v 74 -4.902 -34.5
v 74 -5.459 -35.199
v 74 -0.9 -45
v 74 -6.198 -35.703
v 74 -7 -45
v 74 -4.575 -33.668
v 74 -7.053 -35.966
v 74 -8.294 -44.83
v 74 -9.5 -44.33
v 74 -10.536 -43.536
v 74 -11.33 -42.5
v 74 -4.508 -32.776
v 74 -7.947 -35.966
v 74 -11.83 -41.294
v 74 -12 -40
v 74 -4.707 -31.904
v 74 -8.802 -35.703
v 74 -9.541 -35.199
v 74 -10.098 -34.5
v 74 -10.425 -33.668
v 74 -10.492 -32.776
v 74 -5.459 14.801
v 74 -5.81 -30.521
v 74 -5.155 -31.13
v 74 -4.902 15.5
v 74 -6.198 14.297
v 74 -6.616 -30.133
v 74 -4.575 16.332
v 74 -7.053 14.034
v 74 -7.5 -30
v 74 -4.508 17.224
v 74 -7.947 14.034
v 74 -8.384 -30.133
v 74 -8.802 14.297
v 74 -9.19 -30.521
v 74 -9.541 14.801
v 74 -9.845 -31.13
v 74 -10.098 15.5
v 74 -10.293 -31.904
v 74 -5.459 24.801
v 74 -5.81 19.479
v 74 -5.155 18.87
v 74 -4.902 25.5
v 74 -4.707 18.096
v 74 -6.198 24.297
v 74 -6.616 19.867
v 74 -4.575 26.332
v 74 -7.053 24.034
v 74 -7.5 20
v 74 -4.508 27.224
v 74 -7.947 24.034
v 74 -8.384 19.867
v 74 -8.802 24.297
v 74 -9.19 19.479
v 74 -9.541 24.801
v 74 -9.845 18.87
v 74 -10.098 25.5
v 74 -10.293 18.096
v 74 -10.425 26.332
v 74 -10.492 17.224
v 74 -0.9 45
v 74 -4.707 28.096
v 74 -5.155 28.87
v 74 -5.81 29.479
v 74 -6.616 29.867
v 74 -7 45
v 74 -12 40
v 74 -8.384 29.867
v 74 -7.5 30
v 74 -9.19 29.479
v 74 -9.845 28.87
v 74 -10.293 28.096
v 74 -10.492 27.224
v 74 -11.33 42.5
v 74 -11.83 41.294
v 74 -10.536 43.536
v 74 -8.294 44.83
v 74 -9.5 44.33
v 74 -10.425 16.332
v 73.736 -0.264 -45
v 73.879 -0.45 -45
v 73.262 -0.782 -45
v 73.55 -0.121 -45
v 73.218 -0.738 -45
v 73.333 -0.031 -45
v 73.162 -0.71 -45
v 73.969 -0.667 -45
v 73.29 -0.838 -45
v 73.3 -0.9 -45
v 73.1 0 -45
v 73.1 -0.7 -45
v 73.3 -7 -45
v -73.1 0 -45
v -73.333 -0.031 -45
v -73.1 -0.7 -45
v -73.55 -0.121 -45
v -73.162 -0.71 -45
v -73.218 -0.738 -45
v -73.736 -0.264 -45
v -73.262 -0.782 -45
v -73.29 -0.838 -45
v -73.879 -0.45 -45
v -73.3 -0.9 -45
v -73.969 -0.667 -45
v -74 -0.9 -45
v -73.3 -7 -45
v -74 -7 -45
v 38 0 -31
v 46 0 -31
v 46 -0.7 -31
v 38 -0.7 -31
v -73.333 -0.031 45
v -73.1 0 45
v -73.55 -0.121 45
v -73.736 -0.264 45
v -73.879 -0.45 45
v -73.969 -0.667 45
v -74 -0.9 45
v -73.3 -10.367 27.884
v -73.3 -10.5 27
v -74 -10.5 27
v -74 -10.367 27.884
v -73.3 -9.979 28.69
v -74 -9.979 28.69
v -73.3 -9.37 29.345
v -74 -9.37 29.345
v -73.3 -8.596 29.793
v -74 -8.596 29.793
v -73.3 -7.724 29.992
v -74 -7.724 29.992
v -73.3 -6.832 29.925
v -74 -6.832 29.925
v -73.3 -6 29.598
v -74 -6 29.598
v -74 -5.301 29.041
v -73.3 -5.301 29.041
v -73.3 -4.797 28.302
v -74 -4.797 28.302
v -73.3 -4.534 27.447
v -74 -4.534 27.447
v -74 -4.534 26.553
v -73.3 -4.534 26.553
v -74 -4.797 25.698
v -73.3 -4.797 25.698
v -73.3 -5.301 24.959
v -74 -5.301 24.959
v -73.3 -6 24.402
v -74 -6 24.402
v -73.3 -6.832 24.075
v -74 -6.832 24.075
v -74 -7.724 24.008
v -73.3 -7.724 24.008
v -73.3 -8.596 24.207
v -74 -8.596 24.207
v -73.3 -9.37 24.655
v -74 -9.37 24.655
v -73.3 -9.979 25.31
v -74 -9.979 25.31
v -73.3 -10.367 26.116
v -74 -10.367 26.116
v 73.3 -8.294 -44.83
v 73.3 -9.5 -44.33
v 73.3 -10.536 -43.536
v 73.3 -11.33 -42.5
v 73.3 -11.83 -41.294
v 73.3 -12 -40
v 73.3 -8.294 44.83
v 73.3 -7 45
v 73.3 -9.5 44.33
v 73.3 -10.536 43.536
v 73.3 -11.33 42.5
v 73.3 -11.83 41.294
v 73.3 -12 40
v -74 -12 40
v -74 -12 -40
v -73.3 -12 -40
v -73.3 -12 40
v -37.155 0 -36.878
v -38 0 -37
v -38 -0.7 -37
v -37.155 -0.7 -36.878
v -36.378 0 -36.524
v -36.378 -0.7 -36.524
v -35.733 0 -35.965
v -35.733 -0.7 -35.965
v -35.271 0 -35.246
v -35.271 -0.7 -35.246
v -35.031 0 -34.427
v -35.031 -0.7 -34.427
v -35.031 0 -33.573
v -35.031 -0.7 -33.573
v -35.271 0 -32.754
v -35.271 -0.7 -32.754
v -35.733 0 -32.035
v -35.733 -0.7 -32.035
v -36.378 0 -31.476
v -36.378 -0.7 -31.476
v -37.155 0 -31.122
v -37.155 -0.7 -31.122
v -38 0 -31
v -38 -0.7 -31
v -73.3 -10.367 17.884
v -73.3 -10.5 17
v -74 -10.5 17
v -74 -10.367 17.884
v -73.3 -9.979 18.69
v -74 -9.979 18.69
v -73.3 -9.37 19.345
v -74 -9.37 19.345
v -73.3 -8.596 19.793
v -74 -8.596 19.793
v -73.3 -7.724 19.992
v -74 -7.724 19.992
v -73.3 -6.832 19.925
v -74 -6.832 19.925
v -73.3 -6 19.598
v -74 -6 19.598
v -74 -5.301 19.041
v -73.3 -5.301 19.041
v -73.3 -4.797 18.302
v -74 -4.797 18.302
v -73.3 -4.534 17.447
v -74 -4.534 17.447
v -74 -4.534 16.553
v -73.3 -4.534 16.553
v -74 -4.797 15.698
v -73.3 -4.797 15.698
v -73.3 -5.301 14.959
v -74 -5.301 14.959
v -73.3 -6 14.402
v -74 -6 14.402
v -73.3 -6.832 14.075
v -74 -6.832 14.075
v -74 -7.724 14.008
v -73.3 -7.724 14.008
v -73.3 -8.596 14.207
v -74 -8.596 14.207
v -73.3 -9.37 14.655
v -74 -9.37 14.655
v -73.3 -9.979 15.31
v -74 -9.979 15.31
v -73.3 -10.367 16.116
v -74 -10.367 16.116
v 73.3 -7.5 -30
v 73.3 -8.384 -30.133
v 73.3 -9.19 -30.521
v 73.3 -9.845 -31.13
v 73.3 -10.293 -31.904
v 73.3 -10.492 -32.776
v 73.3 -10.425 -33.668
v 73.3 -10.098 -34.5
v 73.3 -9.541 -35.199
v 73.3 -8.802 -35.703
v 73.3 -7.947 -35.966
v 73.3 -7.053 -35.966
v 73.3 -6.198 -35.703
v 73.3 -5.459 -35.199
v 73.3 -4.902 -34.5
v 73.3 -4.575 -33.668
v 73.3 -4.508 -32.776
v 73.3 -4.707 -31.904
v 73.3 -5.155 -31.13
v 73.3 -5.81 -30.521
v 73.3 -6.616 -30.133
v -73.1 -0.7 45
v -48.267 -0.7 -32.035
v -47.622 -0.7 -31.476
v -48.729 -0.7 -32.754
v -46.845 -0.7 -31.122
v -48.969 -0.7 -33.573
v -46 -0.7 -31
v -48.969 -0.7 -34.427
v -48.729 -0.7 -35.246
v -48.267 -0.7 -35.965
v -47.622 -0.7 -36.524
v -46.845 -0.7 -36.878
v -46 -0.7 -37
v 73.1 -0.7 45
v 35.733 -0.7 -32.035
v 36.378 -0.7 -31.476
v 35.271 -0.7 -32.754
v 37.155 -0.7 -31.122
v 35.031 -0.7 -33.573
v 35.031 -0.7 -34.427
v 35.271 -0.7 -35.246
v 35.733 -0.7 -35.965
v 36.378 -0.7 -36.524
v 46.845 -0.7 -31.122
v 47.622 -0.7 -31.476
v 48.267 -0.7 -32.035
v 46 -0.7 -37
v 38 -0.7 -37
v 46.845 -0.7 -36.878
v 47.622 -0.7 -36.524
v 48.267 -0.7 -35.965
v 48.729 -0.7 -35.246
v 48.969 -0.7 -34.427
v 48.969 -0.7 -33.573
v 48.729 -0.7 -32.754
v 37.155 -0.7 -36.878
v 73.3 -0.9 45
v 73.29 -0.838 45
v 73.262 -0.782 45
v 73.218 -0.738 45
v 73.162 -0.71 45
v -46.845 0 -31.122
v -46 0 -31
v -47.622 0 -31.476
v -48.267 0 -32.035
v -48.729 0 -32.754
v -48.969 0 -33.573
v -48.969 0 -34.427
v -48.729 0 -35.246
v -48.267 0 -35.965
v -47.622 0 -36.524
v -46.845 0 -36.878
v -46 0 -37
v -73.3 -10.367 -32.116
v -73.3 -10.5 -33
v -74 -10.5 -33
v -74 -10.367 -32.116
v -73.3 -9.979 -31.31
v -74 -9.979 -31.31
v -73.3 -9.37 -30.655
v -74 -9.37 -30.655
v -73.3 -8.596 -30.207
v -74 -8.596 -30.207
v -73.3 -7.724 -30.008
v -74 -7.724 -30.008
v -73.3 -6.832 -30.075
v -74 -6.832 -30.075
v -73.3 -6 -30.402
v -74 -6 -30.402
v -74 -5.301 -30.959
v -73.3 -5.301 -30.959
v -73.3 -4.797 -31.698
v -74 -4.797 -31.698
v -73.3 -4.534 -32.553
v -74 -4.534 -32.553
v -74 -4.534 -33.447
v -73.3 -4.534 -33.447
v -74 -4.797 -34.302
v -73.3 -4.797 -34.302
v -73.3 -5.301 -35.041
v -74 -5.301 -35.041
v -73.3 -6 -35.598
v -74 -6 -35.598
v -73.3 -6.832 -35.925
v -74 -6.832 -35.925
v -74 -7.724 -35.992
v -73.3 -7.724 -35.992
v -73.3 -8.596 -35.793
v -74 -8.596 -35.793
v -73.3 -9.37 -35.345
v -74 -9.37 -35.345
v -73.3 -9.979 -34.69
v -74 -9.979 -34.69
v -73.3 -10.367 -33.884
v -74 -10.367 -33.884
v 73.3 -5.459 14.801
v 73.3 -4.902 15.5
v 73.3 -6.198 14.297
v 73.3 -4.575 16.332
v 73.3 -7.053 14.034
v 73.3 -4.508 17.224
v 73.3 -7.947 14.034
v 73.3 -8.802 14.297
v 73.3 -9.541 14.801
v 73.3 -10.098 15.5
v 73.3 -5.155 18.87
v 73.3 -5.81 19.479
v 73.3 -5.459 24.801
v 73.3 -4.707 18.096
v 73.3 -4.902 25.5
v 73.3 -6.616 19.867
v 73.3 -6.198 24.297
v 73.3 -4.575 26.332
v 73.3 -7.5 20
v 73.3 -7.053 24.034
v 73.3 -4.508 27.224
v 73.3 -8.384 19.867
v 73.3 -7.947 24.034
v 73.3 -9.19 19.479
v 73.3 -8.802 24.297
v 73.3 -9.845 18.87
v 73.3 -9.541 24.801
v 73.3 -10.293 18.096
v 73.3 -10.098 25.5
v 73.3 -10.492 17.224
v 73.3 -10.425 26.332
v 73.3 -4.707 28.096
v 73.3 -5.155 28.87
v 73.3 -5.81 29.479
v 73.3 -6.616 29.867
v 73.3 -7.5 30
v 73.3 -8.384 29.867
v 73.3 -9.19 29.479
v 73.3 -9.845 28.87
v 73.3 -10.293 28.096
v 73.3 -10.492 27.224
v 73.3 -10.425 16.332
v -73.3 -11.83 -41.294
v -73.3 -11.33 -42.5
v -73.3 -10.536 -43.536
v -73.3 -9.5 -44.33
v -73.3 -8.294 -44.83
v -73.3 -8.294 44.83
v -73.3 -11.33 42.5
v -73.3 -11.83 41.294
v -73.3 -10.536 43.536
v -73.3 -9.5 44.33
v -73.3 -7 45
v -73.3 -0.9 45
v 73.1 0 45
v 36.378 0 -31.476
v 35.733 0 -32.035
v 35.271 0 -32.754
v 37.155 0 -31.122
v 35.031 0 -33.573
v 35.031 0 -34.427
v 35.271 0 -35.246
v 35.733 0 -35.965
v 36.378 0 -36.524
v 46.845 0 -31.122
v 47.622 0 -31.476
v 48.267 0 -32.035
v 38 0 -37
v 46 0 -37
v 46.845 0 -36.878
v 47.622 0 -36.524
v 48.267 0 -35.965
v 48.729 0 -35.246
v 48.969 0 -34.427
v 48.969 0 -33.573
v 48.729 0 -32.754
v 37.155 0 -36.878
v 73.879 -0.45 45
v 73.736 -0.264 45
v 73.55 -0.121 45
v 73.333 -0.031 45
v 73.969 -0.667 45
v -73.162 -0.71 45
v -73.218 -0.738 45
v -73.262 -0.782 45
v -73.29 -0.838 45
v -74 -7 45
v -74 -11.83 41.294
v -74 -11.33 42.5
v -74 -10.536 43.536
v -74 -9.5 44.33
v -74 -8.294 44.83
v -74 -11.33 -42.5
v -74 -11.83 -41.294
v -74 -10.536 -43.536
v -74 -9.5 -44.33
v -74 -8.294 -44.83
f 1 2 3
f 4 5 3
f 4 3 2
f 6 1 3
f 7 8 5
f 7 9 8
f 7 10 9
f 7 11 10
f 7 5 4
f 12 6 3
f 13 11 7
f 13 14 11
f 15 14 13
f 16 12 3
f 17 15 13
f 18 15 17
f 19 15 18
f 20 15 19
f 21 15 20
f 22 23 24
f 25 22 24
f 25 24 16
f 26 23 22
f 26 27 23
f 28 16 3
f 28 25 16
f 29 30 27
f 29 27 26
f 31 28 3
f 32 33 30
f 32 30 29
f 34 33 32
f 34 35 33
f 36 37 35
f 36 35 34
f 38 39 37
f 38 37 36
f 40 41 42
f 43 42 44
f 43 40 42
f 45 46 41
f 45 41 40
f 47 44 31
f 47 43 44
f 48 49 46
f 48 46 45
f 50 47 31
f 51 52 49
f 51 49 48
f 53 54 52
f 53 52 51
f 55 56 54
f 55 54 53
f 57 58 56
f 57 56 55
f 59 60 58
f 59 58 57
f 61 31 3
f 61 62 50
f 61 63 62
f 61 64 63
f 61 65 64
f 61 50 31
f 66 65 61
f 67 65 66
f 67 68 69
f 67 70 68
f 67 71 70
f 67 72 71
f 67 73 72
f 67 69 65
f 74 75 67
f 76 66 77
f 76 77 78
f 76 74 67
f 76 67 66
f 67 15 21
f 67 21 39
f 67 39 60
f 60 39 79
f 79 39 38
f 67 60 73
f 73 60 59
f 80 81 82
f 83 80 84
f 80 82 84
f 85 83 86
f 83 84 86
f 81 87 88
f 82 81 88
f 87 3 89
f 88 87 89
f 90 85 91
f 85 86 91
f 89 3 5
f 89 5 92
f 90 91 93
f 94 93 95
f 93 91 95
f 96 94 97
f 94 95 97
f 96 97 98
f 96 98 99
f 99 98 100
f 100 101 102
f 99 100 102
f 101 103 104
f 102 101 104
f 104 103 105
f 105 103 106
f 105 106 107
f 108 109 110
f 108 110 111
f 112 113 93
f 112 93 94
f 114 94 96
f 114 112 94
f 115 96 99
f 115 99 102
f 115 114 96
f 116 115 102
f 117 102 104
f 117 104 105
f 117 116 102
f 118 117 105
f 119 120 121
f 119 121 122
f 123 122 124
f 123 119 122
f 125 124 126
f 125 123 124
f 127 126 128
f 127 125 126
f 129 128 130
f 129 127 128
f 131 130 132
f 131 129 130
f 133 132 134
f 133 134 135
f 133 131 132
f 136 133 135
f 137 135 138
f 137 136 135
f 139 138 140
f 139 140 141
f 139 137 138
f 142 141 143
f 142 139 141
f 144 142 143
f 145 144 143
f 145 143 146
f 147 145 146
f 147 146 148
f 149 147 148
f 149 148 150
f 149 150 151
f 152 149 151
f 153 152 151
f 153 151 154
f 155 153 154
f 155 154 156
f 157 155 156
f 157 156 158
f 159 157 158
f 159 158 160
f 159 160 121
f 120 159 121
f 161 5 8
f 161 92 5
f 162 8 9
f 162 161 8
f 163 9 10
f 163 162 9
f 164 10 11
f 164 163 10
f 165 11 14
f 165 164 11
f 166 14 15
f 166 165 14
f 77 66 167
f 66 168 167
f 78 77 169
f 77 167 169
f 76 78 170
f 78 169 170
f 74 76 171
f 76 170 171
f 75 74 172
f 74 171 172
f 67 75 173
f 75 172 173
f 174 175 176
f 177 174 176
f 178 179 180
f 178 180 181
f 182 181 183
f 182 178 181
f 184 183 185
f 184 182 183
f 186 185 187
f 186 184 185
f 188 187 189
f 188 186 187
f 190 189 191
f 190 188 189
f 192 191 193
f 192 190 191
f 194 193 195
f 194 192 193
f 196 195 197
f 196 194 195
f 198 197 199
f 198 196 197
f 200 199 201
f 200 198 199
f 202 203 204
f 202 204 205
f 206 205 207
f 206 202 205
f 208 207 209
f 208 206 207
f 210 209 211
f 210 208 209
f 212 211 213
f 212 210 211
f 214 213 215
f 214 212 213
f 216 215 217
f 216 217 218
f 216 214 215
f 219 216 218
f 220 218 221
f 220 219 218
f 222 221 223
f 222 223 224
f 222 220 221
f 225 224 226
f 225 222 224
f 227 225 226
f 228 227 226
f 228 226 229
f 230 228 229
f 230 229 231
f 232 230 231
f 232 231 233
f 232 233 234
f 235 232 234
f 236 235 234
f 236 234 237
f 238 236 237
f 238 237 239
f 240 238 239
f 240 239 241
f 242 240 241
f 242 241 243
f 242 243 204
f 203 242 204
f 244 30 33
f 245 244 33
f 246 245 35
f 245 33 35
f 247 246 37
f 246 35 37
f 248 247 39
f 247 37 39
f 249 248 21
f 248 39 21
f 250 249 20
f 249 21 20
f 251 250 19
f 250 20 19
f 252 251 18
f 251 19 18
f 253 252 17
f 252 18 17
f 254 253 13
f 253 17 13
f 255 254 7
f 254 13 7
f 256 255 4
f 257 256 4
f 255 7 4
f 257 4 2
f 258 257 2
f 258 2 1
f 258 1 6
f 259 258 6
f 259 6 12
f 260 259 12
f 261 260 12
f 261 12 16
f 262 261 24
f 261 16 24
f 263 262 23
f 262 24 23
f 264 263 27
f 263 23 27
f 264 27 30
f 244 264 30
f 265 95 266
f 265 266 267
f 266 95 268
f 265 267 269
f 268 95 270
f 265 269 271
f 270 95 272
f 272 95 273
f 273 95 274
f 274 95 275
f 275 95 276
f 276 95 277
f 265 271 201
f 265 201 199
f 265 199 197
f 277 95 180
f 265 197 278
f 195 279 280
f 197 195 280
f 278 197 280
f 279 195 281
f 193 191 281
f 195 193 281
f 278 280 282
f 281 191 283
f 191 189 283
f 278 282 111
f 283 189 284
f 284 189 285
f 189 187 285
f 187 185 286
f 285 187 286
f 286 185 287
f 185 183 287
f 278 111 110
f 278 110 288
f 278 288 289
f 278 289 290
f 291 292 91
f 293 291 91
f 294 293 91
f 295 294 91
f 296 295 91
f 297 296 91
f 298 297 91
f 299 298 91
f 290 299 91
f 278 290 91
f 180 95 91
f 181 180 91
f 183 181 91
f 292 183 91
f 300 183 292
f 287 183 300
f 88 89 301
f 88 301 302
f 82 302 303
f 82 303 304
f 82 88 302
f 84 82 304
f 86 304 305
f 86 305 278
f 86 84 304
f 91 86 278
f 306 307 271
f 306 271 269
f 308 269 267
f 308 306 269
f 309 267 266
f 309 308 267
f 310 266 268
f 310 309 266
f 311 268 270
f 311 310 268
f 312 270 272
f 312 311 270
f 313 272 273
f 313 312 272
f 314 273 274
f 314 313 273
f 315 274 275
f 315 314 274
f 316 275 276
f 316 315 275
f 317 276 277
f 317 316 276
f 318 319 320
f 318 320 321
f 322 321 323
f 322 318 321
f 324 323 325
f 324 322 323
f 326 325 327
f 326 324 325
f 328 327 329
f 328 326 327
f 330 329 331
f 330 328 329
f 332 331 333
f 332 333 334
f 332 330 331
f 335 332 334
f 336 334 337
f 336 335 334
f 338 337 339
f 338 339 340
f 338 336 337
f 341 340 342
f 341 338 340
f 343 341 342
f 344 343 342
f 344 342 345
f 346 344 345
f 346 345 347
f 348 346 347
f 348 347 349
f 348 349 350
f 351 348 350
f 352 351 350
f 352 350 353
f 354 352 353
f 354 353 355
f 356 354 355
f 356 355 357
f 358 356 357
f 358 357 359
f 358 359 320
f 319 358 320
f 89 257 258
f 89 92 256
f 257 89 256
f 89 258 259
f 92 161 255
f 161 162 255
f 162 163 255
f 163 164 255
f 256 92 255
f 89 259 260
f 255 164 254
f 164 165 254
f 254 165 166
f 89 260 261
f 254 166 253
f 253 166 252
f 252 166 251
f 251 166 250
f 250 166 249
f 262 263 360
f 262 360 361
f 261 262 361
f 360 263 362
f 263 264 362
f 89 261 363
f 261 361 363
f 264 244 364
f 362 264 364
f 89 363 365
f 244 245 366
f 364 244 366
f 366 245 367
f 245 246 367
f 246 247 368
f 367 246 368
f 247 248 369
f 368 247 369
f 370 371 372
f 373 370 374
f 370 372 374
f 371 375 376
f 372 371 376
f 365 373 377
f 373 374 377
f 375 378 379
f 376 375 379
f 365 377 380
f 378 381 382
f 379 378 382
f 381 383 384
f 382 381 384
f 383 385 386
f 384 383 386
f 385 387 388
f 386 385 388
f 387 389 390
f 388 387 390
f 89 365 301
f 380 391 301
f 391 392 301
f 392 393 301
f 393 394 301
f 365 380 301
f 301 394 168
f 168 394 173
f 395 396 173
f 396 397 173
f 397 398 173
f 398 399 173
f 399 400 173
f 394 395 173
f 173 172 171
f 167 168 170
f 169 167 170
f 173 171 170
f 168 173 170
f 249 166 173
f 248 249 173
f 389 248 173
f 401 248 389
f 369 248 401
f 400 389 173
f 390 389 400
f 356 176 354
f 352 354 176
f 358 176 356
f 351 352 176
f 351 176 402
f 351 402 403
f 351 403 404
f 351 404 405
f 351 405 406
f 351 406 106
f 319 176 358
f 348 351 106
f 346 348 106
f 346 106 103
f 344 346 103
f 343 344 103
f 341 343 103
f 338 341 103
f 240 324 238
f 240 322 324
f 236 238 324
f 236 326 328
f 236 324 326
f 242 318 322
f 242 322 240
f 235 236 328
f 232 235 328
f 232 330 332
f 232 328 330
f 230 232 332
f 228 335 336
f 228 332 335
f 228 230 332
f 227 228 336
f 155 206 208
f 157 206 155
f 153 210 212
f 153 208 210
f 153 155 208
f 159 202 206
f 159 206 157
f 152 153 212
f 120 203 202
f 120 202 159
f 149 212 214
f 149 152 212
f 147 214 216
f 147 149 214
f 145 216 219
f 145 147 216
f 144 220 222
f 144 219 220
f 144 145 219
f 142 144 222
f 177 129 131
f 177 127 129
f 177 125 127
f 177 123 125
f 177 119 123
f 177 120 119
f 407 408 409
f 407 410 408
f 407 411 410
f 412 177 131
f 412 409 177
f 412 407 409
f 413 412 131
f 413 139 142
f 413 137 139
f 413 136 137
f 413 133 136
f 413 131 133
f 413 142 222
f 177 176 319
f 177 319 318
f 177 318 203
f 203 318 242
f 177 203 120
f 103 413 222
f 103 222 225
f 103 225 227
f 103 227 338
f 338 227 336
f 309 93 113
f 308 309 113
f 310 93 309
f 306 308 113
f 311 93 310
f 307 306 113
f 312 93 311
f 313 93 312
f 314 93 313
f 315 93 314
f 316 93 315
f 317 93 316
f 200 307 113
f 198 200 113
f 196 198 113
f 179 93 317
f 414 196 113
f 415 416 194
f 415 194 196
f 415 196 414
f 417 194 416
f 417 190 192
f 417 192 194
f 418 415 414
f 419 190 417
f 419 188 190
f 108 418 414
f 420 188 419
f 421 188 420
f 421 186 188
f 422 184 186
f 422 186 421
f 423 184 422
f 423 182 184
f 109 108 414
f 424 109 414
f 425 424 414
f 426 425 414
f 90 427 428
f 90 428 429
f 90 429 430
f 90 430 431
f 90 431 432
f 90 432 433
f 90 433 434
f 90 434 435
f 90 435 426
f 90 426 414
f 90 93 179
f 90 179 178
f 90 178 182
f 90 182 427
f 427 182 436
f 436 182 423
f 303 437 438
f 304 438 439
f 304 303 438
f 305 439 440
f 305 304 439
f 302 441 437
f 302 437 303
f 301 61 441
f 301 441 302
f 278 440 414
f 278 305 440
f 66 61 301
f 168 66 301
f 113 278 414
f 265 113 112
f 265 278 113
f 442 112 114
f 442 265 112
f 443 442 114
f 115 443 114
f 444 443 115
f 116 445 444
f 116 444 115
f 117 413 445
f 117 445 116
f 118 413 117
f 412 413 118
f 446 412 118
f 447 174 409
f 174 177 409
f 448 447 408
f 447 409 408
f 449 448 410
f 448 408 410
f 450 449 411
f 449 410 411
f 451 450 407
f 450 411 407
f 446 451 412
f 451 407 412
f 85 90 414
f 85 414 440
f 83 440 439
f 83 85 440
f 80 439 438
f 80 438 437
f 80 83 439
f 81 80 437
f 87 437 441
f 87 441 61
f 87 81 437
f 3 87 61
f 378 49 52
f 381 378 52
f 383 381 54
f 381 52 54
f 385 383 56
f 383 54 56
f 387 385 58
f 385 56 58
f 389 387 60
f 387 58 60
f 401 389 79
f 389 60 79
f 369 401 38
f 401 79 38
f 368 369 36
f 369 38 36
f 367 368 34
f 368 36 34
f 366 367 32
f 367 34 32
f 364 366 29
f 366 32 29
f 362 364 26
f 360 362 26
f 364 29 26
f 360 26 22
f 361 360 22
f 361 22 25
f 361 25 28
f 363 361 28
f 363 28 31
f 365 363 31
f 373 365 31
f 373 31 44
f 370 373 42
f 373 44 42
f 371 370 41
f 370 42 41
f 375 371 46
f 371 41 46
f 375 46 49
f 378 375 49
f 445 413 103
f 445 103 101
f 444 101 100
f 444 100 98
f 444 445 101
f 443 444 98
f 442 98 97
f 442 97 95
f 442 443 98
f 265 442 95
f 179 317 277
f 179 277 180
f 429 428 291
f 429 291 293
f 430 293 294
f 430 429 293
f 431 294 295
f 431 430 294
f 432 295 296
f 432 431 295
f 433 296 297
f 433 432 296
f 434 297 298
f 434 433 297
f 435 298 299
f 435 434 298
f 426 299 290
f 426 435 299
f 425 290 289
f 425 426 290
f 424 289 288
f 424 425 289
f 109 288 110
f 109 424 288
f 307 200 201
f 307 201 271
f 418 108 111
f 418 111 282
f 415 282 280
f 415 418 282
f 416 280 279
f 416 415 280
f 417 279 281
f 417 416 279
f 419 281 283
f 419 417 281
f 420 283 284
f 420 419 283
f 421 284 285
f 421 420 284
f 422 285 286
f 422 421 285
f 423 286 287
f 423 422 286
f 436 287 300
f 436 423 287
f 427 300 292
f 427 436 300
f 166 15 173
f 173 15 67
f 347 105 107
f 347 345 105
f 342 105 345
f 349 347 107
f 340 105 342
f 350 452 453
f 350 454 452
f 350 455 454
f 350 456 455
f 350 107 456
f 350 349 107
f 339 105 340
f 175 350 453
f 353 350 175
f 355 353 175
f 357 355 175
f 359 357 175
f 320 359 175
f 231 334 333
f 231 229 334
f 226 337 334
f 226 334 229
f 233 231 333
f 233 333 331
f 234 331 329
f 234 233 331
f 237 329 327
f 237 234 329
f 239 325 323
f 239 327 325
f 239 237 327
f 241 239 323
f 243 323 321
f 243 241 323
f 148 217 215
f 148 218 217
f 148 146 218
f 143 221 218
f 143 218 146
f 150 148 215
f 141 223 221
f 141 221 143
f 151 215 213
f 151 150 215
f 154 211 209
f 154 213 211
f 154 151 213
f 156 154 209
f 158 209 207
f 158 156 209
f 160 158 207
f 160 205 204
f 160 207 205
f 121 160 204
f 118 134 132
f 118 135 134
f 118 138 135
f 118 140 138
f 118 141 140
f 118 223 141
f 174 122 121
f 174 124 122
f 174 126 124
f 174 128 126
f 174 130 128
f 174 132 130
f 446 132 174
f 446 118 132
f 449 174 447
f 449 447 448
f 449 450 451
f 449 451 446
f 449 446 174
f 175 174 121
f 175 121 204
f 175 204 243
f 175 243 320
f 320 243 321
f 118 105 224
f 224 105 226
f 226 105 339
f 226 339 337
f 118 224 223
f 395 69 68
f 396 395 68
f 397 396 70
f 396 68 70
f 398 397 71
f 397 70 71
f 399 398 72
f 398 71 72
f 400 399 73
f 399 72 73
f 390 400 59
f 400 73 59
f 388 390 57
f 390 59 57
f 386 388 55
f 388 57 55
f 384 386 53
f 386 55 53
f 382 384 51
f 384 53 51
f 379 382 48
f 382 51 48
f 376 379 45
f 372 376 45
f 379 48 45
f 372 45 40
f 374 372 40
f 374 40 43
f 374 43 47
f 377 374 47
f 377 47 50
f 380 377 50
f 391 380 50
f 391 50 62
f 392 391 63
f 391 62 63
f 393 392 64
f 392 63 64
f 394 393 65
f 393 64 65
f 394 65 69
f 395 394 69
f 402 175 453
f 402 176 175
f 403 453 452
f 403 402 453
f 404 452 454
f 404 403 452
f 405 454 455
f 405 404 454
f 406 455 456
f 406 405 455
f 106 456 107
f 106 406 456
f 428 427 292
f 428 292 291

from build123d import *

# Parameters (mm, degrees)
SKETCH_1_W                         = 148
SKETCH_1_H                         = 90
SM_BASE_FLANGE_1_DEPTH             = 0.7
SM_EDGE_FLANGE_1_STRIP_W           = 3.2
SM_EDGE_FLANGE_1_STRIP_H           = 0.7
SM_EDGE_FLANGE_1_STRIP_CUT_DEPTH   = 90
SM_EDGE_FLANGE_1_STRIP_2_W         = 3.2
SM_EDGE_FLANGE_1_STRIP_2_H         = 0.7
SM_EDGE_FLANGE_1_STRIP_CUT_2_DEPTH = 90
SM_EDGE_FLANGE_1_DEPTH             = 90
SM_EDGE_FLANGE_1_PROFILE_W         = 90
SM_EDGE_FLANGE_1_PROFILE_H         = 11.1
SM_EDGE_FLANGE_1_PROFILE_R         = 3
SM_EDGE_FLANGE_1_FLAT_DEPTH        = 0.7
SM_EDGE_FLANGE_1_BEND_DEPTH        = 90
FILLET_2_R                         = 5
CUT_EXTRUDE_START                  = -10
SKETCH_15_R                        = 3
CUT_EXTRUDE_1_DEPTH                = 10


# Sheet-metal steps are written as plain solids
with BuildPart() as part:
    # Sketch 1 → 基体-法兰1 (new body)
    with BuildSketch(Plane(origin=(0, 0, 0), x_dir=(1, 0, 0), z_dir=(0, 1, 0))):
        Rectangle(SKETCH_1_W, SKETCH_1_H)
        with BuildLine():
            Line((-46, 37), (-38, 37))
            ThreePointArc((-38, 37), (-35, 34), (-38, 31))
            Line((-38, 31), (-46, 31))
            ThreePointArc((-46, 31), (-49, 34), (-46, 37))
        make_face(mode=Mode.SUBTRACT)
        with BuildLine():
            Line((38, 37), (46, 37))
            ThreePointArc((46, 37), (49, 34), (46, 31))
            Line((46, 31), (38, 31))
            ThreePointArc((38, 31), (35, 34), (38, 37))
        make_face(mode=Mode.SUBTRACT)
    extrude(amount=-SM_BASE_FLANGE_1_DEPTH)

    # 边线-法兰1 strip (across the edge) → 边线-法兰1 strip cut (cut)
    with BuildSketch(Plane(origin=(74, -0.7, -45), x_dir=(-1, 0, 0), z_dir=(0, 0, 1))):
        with Locations((-0.7, -0.35)):
            Rectangle(SM_EDGE_FLANGE_1_STRIP_W, SM_EDGE_FLANGE_1_STRIP_H)
    extrude(amount=SM_EDGE_FLANGE_1_STRIP_CUT_DEPTH, mode=Mode.SUBTRACT)

    # 边线-法兰1 strip 2 (across the edge) → 边线-法兰1 strip cut 2 (cut)
    with BuildSketch(Plane(origin=(-74, -0.7, 45), x_dir=(1, 0, 0), z_dir=(0, 0, -1))):
        with Locations((-0.7, -0.35)):
            Rectangle(SM_EDGE_FLANGE_1_STRIP_2_W, SM_EDGE_FLANGE_1_STRIP_2_H)
    extrude(amount=SM_EDGE_FLANGE_1_STRIP_CUT_2_DEPTH, mode=Mode.SUBTRACT)

    # 边线-法兰1 bend section (across the edge) → 边线-法兰1 (add)
    with BuildSketch(Plane(origin=(74, -0.7, -45), x_dir=(-1, 0, 0), z_dir=(0, 0, 1))):
        with BuildLine():
            Line((0, 0.2), (0.7, 0.2))
            ThreePointArc((0.7, 0.2), (0.758578644, 0.058578644), (0.9, 0))
            Line((0.9, 0), (0.9, -0.7))
            ThreePointArc((0.9, -0.7), (0.263603897, -0.436396103), (0, 0.2))
        make_face()
    extrude(amount=SM_EDGE_FLANGE_1_DEPTH)

    # 边线-法兰1 profile (on flange) → 边线-法兰1 flat (add)
    with BuildSketch(Plane(origin=(74, -0.7, 0), x_dir=(0, 0, 1), z_dir=(1, 0, 0))):
        with Locations((0, 5.75)):
            Rectangle(SM_EDGE_FLANGE_1_PROFILE_W, SM_EDGE_FLANGE_1_PROFILE_H)
        with Locations((17, 6.8)):
            Circle(SM_EDGE_FLANGE_1_PROFILE_R, mode=Mode.SUBTRACT)
        with Locations((27, 6.8)):
            Circle(SM_EDGE_FLANGE_1_PROFILE_R, mode=Mode.SUBTRACT)
        with Locations((-33, 6.8)):
            Circle(SM_EDGE_FLANGE_1_PROFILE_R, mode=Mode.SUBTRACT)
    extrude(amount=-SM_EDGE_FLANGE_1_FLAT_DEPTH)

    # 边线-法兰1 section (across the edge) → 边线-法兰1 bend (add)
    with BuildSketch(Plane(origin=(-74, -0.7, 45), x_dir=(1, 0, 0), z_dir=(0, 0, -1))):
        with BuildLine():
            Line((0, 0.2), (0, 11.3))
            Line((0, 11.3), (0.7, 11.3))
            Line((0.7, 11.3), (0.7, 0.2))
            ThreePointArc((0.7, 0.2), (0.758578644, 0.058578644), (0.9, 0))
            Line((0.9, 0), (0.9, -0.7))
            ThreePointArc((0.9, -0.7), (0.263603897, -0.436396103), (0, 0.2))
        make_face()
    extrude(amount=SM_EDGE_FLANGE_1_BEND_DEPTH)

    # 圆角2
    fillet_2_edges = [part.edges().sort_by_distance(p)[0] for p in [
        (-73.65, -12, 45),
        (-73.65, -12, -45),
        (73.65, -12, -45),
        (73.65, -12, 45),
    ]]
    fillet(fillet_2_edges, radius=FILLET_2_R)

    # 草图15 → 切除-拉伸1 (cut)
    with BuildSketch(Plane.ZY.offset(74).offset(CUT_EXTRUDE_START)):
        with Locations(Location((-33, -7.5, 0), (0, 0, 270))):
            Circle(SKETCH_15_R)
        with Locations(Location((17, -7.5, 0), (0, 0, 270))):
            Circle(SKETCH_15_R)
        with Locations(Location((27, -7.5, 0), (0, 0, 270))):
            Circle(SKETCH_15_R)
    extrude(amount=CUT_EXTRUDE_1_DEPTH, mode=Mode.SUBTRACT)


solid = part.part
